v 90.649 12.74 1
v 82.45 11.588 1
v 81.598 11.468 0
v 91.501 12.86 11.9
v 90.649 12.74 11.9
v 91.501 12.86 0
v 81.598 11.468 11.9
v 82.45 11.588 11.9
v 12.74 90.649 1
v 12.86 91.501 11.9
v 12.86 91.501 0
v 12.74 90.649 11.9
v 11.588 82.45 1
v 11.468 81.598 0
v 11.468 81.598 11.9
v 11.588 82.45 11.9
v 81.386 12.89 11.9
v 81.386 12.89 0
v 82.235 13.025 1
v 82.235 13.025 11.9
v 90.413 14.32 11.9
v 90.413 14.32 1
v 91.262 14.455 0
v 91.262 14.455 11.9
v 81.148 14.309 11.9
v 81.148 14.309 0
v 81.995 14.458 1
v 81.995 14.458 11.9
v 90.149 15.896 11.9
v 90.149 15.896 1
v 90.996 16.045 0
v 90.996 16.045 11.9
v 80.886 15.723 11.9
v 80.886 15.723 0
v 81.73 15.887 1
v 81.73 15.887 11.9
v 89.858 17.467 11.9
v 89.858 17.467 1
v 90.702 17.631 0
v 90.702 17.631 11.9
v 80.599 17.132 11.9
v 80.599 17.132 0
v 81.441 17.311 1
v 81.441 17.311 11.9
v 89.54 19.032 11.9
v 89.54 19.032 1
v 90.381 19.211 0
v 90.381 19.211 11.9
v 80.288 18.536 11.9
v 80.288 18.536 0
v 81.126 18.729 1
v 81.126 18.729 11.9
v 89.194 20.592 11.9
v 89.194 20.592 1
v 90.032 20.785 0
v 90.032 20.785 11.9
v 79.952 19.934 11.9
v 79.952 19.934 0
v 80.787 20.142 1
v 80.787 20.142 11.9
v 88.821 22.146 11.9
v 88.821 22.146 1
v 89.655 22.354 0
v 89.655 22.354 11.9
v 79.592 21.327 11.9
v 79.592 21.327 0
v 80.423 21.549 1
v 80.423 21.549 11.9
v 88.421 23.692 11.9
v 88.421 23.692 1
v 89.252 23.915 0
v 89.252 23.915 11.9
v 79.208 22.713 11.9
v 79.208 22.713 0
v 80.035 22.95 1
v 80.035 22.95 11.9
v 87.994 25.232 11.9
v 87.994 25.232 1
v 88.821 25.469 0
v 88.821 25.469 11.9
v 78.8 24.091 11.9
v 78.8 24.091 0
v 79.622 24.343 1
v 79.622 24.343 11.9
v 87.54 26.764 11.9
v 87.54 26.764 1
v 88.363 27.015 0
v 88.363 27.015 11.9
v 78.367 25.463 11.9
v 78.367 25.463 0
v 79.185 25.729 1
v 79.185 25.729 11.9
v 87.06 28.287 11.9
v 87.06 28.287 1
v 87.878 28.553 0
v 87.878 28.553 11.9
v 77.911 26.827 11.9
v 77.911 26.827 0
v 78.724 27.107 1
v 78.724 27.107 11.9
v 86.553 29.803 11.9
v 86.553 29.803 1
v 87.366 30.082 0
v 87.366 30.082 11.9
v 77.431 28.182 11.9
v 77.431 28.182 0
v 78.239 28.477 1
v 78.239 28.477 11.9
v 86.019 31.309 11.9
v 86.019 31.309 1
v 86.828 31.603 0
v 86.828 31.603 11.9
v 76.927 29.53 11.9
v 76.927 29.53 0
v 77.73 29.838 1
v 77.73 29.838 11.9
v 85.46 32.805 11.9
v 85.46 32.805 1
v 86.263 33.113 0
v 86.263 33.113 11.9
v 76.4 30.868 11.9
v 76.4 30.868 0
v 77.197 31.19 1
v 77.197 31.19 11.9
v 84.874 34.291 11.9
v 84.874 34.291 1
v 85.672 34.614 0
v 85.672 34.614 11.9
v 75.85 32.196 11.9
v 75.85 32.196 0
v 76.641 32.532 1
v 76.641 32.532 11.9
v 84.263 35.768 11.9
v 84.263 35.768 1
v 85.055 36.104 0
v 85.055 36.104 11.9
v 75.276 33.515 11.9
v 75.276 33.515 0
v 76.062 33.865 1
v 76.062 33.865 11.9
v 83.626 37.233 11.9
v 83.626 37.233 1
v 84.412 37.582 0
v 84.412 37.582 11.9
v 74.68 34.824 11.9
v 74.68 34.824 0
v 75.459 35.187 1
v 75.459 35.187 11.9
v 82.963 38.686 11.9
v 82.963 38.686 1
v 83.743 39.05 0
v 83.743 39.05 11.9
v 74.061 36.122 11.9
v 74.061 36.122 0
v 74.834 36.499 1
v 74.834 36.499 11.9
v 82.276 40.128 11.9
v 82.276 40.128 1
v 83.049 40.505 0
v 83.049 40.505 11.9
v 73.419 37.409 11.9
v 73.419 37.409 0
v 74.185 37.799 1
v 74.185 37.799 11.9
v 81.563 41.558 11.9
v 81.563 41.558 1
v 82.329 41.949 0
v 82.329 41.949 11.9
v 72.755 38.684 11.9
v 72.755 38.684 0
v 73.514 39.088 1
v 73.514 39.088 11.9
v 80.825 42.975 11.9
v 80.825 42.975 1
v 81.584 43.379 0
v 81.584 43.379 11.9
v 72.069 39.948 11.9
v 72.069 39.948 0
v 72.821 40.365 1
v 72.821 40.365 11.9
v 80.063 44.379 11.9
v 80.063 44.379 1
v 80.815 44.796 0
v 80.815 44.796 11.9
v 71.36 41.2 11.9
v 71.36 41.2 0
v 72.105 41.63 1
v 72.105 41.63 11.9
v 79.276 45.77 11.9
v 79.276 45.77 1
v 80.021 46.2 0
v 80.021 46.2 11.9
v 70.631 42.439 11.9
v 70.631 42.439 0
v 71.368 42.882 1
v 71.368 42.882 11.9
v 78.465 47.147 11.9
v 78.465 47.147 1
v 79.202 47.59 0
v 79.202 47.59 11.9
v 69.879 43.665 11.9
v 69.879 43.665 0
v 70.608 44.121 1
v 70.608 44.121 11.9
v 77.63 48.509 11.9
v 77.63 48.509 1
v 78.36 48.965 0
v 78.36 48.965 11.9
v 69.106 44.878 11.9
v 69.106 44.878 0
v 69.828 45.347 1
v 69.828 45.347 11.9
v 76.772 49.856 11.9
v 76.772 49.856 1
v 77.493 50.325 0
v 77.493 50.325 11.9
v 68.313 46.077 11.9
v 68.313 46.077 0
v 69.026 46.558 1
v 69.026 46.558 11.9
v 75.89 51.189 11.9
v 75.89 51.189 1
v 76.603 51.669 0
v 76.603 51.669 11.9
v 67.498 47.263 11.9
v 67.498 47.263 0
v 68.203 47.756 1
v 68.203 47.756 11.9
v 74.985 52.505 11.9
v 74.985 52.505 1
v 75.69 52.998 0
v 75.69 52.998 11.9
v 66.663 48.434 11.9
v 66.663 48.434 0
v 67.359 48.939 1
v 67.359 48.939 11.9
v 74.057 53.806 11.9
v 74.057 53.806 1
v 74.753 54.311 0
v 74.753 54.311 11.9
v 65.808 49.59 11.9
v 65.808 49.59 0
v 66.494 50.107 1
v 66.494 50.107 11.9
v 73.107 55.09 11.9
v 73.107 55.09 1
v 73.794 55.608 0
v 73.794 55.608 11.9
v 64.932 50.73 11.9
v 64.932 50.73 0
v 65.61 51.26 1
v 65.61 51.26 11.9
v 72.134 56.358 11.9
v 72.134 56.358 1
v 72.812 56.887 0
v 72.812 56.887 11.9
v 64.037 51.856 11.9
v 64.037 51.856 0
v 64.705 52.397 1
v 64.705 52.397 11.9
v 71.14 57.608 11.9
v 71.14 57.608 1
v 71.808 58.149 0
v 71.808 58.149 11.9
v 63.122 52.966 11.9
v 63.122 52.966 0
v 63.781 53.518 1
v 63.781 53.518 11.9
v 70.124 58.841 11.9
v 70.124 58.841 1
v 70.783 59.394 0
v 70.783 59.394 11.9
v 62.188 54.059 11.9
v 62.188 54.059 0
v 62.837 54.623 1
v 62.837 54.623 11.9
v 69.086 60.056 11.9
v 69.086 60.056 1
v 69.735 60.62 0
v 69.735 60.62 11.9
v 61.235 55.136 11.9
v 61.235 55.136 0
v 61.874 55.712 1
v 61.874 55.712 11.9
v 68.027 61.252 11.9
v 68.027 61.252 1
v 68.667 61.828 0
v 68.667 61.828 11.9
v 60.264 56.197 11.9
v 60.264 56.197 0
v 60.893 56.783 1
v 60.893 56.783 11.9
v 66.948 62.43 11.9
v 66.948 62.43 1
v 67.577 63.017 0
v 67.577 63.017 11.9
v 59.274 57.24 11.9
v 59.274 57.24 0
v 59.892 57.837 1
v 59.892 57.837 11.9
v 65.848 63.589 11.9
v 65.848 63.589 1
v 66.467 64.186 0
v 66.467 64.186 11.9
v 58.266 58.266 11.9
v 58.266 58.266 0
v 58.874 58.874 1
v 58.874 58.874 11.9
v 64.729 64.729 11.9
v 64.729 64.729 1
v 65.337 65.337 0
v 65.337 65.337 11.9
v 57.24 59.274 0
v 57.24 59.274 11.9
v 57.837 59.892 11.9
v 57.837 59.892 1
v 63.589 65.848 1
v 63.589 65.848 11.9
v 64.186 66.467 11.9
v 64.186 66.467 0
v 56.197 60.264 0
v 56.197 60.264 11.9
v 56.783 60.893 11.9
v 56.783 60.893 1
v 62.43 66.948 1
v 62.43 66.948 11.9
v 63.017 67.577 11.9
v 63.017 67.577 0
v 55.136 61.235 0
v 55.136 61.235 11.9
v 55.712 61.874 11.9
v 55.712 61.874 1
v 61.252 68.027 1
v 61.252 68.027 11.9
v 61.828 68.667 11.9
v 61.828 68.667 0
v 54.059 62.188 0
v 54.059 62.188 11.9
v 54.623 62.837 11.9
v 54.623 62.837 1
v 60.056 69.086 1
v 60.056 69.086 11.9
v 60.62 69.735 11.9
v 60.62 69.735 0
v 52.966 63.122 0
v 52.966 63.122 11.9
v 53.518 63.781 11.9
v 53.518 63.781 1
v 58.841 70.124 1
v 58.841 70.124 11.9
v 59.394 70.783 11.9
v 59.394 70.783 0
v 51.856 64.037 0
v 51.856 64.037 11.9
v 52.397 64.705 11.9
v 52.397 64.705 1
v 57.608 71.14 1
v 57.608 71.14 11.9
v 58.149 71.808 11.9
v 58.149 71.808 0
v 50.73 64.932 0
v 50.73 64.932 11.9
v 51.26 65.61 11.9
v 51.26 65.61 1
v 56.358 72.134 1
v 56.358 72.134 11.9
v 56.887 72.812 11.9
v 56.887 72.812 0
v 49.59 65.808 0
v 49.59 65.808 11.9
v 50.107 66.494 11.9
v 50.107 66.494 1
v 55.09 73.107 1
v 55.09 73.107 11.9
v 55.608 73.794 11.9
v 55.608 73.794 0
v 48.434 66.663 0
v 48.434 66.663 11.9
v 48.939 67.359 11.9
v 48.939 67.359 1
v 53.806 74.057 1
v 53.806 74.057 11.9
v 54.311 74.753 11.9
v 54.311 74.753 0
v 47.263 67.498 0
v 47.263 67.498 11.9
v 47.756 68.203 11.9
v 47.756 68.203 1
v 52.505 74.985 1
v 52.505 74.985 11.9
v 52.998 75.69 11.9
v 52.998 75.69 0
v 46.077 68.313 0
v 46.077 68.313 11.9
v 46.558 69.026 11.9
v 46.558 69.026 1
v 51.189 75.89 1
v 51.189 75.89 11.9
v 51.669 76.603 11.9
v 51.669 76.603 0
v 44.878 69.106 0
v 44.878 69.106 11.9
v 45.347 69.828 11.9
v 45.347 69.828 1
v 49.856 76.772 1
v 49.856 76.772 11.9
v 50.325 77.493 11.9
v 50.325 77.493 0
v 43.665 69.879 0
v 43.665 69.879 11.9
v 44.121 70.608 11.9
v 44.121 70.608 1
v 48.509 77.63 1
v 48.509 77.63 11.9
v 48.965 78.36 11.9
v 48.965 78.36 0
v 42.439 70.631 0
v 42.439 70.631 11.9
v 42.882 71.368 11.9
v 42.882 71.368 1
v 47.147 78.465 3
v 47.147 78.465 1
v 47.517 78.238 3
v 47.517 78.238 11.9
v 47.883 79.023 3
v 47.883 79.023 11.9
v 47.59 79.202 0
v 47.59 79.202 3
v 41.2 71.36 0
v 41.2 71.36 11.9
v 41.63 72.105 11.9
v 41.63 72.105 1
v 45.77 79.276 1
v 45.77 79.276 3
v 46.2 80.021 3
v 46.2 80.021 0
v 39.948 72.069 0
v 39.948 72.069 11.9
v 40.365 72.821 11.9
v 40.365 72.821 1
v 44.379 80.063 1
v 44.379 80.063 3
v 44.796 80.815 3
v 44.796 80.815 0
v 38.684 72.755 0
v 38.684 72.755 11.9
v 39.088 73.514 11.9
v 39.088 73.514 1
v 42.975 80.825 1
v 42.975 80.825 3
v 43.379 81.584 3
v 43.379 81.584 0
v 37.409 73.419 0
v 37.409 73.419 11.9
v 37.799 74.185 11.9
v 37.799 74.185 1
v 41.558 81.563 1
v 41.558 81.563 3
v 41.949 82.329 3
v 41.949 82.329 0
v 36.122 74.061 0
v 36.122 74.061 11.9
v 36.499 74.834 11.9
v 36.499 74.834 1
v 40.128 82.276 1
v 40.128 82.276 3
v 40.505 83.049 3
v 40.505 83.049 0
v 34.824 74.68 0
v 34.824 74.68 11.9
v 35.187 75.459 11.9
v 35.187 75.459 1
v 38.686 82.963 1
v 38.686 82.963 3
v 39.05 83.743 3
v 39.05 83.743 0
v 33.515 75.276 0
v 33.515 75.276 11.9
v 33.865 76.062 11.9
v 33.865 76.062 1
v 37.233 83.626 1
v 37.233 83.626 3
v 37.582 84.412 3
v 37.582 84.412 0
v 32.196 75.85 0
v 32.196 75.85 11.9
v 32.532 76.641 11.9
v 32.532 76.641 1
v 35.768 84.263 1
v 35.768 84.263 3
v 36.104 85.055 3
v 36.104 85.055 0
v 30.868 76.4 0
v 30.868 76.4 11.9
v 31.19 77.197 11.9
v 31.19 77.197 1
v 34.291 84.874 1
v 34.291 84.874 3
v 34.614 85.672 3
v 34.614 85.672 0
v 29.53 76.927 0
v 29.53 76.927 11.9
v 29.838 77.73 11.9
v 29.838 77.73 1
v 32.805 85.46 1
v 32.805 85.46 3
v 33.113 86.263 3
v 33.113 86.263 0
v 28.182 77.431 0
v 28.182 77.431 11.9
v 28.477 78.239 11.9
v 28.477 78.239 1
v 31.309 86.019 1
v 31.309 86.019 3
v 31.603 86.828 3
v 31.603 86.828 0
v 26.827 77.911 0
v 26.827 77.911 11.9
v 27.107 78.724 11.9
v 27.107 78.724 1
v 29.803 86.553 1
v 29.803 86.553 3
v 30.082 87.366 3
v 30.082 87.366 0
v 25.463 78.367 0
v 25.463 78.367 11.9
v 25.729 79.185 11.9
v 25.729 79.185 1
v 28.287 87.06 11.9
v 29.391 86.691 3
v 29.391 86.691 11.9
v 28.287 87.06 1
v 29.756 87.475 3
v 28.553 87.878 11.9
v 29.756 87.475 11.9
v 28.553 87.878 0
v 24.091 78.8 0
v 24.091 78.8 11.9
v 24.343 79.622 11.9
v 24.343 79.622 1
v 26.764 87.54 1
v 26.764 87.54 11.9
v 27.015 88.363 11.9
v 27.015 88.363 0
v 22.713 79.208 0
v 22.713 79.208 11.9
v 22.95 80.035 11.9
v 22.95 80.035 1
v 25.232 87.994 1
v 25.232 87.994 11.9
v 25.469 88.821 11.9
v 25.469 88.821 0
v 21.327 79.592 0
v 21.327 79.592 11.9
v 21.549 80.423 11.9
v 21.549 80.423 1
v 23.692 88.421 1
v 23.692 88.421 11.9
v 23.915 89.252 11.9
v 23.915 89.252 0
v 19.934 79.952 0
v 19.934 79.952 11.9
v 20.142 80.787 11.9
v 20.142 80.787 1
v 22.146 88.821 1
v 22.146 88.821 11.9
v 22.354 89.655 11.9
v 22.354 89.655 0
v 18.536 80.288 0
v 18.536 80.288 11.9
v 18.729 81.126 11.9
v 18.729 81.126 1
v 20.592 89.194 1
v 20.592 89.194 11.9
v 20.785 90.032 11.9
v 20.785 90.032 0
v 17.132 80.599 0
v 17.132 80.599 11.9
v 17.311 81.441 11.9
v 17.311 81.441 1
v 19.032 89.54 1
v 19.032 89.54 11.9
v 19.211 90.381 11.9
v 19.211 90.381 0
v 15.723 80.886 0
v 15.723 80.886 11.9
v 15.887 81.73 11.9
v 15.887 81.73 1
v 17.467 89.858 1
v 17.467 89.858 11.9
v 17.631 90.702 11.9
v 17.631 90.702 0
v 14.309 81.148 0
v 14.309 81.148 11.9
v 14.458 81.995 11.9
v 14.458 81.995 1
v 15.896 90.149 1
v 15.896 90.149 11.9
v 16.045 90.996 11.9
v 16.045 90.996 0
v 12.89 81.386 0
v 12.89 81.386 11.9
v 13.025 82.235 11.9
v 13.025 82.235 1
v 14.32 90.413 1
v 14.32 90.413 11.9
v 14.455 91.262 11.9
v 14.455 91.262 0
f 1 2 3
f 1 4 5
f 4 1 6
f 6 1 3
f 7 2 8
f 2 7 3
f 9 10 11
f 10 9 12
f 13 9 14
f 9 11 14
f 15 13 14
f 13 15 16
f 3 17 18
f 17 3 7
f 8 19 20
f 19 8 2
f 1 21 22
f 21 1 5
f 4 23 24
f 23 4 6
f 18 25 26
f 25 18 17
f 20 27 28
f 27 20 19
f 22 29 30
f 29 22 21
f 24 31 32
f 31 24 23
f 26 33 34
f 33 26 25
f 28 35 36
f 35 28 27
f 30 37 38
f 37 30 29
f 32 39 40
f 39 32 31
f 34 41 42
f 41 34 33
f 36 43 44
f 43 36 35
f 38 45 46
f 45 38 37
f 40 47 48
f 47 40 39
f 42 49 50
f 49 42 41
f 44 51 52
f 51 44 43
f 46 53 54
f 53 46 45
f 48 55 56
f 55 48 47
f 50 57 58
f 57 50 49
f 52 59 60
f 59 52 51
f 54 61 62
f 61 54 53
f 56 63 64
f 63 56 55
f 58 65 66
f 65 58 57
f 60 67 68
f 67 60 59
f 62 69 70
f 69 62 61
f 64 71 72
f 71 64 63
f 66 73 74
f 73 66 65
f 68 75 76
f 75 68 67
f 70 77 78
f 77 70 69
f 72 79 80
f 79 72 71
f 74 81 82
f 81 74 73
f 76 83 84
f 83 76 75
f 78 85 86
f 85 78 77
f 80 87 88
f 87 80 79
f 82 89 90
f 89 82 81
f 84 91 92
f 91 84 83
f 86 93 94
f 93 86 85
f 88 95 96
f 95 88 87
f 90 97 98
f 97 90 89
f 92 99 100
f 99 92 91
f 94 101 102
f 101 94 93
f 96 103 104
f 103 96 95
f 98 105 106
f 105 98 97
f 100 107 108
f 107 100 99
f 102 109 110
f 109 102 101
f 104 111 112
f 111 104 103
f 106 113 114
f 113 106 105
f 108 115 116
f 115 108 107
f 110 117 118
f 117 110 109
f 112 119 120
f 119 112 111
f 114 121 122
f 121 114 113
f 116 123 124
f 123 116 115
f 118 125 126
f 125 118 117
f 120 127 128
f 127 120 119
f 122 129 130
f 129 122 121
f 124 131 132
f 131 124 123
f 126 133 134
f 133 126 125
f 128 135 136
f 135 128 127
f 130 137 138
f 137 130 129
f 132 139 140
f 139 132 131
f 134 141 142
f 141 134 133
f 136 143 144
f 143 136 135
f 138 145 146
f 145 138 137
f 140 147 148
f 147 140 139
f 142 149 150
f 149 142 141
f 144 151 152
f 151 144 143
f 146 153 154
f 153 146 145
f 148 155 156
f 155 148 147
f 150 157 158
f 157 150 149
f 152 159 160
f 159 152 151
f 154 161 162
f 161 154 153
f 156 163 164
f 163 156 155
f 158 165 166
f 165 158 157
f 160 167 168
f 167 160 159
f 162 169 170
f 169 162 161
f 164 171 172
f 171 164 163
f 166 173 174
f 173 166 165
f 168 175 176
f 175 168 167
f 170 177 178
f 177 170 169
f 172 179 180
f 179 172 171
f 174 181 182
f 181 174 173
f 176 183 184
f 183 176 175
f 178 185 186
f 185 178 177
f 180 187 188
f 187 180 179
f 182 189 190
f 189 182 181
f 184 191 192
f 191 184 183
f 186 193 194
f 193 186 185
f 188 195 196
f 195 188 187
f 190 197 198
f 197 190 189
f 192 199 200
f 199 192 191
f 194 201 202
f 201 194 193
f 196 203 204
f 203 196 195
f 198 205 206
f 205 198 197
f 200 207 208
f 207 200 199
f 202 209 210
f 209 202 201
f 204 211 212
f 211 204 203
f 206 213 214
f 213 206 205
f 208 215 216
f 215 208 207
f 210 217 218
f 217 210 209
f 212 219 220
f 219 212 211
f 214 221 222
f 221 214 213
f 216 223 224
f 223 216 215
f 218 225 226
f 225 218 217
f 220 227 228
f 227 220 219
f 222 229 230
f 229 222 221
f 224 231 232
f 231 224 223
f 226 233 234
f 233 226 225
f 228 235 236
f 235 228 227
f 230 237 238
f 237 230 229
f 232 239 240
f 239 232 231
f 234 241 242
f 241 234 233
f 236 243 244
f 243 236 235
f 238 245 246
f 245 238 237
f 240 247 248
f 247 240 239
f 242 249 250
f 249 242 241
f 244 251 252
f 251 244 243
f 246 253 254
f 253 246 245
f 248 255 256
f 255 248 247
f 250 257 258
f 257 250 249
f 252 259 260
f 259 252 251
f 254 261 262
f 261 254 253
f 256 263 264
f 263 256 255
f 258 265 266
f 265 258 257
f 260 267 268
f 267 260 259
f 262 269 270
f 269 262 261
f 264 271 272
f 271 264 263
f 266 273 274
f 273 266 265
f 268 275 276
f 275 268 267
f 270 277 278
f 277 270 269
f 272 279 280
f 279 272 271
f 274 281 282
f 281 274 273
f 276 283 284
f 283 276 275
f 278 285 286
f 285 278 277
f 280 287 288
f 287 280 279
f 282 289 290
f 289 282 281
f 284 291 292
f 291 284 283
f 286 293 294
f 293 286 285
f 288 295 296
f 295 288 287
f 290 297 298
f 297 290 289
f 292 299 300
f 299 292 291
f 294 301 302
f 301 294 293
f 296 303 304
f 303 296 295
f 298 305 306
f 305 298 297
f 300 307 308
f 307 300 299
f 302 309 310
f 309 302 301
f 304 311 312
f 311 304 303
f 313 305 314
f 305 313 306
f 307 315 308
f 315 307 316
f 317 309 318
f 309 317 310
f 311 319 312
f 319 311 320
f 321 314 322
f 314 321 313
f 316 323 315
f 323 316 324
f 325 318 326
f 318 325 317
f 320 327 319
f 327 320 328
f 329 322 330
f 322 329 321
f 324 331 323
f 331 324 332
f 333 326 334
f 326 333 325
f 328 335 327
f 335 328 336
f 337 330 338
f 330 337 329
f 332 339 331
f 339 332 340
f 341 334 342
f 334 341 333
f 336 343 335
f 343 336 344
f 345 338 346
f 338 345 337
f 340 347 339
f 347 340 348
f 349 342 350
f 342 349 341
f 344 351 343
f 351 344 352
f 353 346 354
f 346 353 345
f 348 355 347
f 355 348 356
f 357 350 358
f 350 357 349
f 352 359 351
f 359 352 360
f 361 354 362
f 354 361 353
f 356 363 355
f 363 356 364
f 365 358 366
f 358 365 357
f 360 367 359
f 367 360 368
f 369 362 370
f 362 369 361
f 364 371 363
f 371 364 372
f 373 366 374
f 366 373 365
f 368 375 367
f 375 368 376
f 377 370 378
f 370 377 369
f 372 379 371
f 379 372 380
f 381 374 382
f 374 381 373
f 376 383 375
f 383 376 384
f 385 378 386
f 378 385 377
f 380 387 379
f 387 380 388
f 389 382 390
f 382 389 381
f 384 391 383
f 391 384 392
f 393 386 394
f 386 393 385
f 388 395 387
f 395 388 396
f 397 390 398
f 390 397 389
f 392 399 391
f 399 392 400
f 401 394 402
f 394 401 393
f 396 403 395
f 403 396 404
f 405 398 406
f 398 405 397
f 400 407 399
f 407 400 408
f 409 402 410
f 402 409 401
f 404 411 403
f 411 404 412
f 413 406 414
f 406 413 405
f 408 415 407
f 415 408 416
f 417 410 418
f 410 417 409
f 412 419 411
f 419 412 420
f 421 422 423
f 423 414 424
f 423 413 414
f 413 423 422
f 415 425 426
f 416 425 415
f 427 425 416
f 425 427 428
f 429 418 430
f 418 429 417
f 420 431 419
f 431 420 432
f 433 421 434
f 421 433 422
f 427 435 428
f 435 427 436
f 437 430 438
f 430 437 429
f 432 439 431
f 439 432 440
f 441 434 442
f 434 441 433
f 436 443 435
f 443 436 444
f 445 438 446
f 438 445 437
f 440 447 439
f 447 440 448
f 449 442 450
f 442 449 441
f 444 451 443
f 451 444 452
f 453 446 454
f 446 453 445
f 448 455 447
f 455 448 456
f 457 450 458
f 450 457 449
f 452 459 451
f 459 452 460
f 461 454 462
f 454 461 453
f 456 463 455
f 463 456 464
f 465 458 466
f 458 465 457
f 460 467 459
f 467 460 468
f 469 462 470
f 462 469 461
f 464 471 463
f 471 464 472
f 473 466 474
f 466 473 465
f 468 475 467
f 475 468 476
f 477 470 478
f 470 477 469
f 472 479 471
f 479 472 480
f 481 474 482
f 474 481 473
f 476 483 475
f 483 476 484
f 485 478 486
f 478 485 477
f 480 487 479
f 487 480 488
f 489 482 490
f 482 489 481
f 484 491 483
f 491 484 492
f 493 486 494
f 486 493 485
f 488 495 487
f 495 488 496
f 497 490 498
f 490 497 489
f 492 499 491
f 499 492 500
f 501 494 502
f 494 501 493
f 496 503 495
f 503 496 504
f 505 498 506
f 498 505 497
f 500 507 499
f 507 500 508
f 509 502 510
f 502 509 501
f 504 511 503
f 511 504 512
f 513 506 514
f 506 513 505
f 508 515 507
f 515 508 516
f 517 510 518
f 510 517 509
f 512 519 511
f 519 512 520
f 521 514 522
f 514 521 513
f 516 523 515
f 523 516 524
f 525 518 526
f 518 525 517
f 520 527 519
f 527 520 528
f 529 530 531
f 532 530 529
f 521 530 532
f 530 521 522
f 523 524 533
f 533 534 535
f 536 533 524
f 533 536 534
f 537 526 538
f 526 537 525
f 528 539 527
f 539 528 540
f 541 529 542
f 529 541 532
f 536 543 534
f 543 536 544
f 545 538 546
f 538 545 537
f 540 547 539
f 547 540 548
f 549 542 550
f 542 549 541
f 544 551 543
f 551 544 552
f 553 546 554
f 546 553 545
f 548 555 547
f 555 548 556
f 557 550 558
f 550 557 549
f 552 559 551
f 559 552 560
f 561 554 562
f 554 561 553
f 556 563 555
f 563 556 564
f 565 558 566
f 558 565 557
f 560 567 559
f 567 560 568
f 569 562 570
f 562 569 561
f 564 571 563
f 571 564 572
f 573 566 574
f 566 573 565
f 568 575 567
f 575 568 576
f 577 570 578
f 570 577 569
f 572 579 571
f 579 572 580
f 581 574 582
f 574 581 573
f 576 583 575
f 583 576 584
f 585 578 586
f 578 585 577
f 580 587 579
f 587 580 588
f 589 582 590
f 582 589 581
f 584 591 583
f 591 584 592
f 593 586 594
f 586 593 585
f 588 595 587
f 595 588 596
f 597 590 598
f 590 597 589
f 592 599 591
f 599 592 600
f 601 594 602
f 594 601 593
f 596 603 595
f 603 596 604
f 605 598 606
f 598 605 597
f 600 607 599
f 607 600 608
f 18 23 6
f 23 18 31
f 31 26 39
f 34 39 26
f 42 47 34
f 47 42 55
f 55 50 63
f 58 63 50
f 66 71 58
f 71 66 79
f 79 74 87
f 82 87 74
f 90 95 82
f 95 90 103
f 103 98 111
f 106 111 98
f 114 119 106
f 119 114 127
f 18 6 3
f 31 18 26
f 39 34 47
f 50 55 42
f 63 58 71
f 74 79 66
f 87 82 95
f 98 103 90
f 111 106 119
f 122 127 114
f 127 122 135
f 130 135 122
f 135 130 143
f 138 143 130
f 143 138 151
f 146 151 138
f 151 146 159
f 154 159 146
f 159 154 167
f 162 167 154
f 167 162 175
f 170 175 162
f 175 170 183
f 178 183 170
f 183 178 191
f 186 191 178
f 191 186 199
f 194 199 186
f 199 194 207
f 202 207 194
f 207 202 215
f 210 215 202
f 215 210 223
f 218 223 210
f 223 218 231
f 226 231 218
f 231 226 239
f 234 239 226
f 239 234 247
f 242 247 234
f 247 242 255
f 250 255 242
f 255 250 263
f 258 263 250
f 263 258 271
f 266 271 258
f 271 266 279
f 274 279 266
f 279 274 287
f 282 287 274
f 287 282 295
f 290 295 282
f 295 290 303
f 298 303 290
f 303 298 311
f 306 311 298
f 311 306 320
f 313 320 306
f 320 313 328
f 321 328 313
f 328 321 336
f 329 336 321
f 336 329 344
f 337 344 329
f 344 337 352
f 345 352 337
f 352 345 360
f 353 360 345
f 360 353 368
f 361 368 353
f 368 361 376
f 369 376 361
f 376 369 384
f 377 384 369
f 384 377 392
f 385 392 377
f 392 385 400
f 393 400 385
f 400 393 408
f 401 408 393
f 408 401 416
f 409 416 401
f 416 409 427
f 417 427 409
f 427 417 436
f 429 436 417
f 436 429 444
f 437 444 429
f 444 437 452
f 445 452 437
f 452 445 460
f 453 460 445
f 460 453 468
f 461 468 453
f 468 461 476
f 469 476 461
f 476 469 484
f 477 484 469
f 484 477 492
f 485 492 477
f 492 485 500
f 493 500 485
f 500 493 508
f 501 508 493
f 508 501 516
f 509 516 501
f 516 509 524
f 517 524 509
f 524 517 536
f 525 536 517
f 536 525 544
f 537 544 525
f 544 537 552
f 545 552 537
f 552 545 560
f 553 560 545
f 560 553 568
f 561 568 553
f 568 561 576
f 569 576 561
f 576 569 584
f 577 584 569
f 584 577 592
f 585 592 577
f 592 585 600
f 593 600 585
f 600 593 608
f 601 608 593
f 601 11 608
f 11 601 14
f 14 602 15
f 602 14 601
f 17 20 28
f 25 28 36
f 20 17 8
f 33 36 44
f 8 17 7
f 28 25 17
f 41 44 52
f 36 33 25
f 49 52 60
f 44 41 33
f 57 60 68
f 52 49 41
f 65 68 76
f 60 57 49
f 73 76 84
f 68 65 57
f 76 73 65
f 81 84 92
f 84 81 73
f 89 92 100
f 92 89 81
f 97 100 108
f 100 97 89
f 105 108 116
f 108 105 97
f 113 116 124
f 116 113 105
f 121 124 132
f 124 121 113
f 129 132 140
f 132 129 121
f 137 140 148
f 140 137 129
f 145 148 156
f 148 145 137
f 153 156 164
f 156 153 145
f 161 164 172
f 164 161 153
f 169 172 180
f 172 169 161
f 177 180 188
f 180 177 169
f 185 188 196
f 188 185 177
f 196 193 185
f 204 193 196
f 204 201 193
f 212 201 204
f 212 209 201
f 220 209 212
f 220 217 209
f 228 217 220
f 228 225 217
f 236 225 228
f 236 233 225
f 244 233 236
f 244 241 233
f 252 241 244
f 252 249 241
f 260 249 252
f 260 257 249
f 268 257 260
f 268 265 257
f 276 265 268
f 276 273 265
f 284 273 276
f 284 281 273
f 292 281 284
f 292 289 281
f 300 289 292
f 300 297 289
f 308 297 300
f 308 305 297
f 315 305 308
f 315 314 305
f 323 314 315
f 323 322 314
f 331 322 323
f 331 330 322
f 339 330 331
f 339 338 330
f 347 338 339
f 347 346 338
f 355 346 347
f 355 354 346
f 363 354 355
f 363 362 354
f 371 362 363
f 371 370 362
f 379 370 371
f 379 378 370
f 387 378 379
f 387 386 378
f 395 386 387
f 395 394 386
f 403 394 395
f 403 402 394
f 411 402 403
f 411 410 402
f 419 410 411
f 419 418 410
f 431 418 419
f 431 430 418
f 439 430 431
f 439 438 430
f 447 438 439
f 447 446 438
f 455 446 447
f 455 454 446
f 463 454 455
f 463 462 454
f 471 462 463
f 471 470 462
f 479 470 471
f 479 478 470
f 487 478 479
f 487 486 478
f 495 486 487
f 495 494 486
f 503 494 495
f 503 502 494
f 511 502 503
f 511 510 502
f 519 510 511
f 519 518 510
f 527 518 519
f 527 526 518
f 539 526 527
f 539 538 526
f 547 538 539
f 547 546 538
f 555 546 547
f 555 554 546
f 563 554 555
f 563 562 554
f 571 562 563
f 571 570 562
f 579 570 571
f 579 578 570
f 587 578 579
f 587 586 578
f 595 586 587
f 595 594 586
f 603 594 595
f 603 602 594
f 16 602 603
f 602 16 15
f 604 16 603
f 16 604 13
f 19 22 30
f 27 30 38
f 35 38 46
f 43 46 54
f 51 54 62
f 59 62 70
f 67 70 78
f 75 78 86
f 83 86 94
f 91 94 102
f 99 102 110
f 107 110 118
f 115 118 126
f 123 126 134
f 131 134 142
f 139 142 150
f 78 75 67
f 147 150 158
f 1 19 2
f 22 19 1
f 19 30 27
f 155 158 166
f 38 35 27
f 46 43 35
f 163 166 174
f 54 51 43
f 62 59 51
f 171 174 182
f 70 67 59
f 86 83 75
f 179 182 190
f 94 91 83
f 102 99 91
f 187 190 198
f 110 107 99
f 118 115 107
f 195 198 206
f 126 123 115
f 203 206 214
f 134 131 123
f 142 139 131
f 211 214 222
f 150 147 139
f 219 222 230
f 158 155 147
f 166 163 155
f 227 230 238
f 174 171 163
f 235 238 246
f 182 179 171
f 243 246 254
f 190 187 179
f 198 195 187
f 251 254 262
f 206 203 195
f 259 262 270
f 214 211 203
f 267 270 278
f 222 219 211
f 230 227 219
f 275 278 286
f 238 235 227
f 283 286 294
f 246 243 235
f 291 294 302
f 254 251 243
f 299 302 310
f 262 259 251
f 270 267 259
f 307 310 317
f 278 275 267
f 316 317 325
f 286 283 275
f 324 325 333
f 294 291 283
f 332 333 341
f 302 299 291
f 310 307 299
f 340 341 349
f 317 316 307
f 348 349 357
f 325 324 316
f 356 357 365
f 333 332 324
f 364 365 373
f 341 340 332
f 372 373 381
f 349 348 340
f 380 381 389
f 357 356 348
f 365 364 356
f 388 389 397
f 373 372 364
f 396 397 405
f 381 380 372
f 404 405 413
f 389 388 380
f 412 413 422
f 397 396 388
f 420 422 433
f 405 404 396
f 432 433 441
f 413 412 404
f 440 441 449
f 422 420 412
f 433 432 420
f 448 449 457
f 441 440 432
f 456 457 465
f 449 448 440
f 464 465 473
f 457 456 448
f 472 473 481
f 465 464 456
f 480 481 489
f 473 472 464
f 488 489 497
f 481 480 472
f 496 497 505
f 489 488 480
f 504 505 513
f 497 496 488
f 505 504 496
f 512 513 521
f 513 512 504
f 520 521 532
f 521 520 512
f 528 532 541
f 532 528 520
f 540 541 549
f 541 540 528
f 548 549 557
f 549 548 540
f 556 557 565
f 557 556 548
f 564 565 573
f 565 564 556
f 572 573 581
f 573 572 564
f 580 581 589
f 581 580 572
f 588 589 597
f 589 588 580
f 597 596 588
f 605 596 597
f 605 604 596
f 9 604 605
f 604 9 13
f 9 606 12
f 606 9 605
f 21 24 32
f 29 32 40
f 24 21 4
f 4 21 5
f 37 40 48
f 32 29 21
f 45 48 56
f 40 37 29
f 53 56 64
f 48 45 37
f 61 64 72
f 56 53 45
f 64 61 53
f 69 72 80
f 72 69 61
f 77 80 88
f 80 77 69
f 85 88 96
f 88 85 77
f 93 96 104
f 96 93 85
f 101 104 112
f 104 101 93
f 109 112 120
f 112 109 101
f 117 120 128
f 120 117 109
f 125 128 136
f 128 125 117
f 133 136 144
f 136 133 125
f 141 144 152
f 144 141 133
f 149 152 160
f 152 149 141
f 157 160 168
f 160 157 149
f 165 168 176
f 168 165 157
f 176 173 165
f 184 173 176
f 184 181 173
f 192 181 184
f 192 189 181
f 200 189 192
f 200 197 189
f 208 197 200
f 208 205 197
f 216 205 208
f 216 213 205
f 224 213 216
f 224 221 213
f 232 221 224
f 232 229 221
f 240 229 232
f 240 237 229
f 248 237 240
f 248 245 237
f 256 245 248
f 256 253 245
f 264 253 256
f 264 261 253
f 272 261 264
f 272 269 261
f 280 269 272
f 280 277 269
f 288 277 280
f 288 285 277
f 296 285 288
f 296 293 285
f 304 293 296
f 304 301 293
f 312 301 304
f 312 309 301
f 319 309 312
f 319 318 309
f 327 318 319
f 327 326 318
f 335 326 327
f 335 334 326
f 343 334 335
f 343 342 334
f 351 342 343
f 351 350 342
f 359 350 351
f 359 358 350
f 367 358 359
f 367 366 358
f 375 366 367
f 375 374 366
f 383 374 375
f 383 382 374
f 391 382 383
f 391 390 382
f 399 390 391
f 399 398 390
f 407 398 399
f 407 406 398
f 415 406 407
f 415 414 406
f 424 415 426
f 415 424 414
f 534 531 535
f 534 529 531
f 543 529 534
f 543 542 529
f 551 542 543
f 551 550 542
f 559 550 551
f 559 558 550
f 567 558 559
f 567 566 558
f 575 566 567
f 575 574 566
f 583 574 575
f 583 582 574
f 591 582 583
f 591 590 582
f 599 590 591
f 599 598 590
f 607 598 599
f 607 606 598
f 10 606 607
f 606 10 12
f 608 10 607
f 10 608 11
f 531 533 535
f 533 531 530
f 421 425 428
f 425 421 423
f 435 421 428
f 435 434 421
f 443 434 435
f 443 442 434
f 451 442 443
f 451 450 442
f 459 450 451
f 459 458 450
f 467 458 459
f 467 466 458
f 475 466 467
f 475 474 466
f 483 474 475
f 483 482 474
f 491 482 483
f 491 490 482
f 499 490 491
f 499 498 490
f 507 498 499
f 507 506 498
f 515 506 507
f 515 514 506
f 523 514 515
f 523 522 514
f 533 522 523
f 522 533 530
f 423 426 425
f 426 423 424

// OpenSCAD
// -----------------------------------------------------------------------------
// 3D-Model (OpenSCAD) Adventskranz.
//
// Author: Bernhard Bablok
// License: GPL3
//
// Website: https://github.com/bablokb/pcb-adventskranz
//
// -----------------------------------------------------------------------------

$fa = 1;
$fs = 0.4;

fuzz = 0.001;

k_b   = 3;             // base
k_h   = 15;            // height
kr_o  = 195/2;         // outer radius
kr_w  = 20;            // width
kr_i  = kr_o - kr_w;   // inner radius
kr_c  = 10;            // cutout-width
k_fac = 0.95;          // slimify-factor
p_h   = 1.6;           // pcb-height

b_h   = 5;             // base height
br_o  = 20;            // base outer radius
br_i  = 10.5;          // base inner radius
b_fac = 0.6;           // slimify-factor (> br_i/br_o)


// --- Generisches Ring Modul   ----------------------------------------------
// Der Faktor gibt an, um wieviel sich die Breite nach unten verjüngt

module ring(o,i,h,fac=1) {
  difference() {
    cylinder(h,o*fac,o);
    translate([0,0,-fuzz]) cylinder(h+2*fuzz,i,i);
  }
}

// --- Basis des Kranz   -----------------------------------------------------
// zusammengesetzt aus einem großen Ring und vier Ringen für die Kerzen

module basis() {
  ring(kr_o,kr_i,k_h,fac=k_fac);
  translate([kr_i+kr_w/2,0,0])  ring(br_o,br_i,k_h+b_h,fac=b_fac);
  translate([-kr_i-kr_w/2,0,0]) ring(br_o,br_i,k_h+b_h,fac=b_fac);
  translate([0,kr_i+kr_w/2,0])  ring(br_o,br_i,k_h+b_h,fac=b_fac);
  translate([0,-kr_i-kr_w/2,0]) ring(br_o,br_i,k_h+b_h,fac=b_fac);
}

// --- Kranz   ---------------------------------------------------------------
// Zusätzliche Ausschnitte für die Platinen je Kerzenhalter sowie
// einem 360°-Kabelkanal

module kranz() {
  difference() {
    basis();
    translate([kr_i+kr_w/2,0,k_h-p_h])  cylinder(b_h+p_h+fuzz,br_i,br_i);
    translate([-kr_i-kr_w/2,0,k_h-p_h]) cylinder(b_h+p_h+fuzz,br_i,br_i);
    translate([0,kr_i+kr_w/2,k_h-p_h])  cylinder(b_h+p_h+fuzz,br_i,br_i);
    translate([0,-kr_i-kr_w/2,k_h-p_h]) cylinder(b_h+p_h+fuzz,br_i,br_i);
    // Kabelkanal
    translate([0,0,k_b]) ring(kr_o-(kr_w-kr_c)/2,kr_i+(kr_w-kr_c)/2,k_h+b_h+fuzz);
    // Ausschnitt für Anschluss
    rotate([0,0,25]) translate([kr_i+6,-10,k_b]) cube([30,20,30]);
  }
}

// --- Abdeckung Kabelkanal   ------------------------------------------------

module cover(anschluss=false) {
  delta  = 0.1;                     // Verkleinerung für Passgenauigkeit
  k      = (kr_w-kr_c)/2 - 2*delta; // (Breite Ring - Breite Cutout)/2
  d = k_h - k_b - delta;            // Cutout-Depth (Höhe - Basis)
  w2 = 0.86;                        // Wanddicke, 2 Schichten
  c_b = 1;                          // Basis Cover
  winkel = 8;                       // Abstand in Grad zur Achse

  points = [
    [delta + kr_i+k,     0],
    [delta + kr_i+k+kr_c,0],
    [delta + kr_i+k+kr_c,d],
    [delta + kr_i+k+kr_c-w2,d],
    [delta + kr_i+k+kr_c-w2,c_b],
    [delta + kr_i+k+w2,c_b],
    [delta + kr_i+k+w2,d],
    [delta + kr_i+k,d]
    ];
  difference() {
    rotate([0,0,winkel]) rotate_extrude(angle=90-2*winkel) polygon(points);
    if (anschluss) {
      rotate([0,0,90-25]) translate([kr_i+6,-10,k_b]) cube([30,20,30]);
    }
  }
}

// --- Ausschnitte für Testdruck   -------------------------------------------

//intersection() {
//  rotate([0,0,45]) kranz();
//  translate([10,40,0]) cube(90);
//}

//intersection() {
//  cover(true);
//  translate([70,0,0]) cube(90);
//}

// --- Test für Kabelkanalabdeckung   ----------------------------------------

//rotate([0,0,45]) color("blue") translate([0,0,k_h]) mirror([0,0,90]) cover(true);

// --- Finale Objekte   ------------------------------------------------------

// rotate([0,0,45]) kranz();       // kompletter Kranz, gedreht wg. Druckbett
// cover();                        // Abdeckung Kabelkanal ohne Ausschnitt
   cover(true);                    // Abdeckung Kabelkanal mit  Ausschnitt
